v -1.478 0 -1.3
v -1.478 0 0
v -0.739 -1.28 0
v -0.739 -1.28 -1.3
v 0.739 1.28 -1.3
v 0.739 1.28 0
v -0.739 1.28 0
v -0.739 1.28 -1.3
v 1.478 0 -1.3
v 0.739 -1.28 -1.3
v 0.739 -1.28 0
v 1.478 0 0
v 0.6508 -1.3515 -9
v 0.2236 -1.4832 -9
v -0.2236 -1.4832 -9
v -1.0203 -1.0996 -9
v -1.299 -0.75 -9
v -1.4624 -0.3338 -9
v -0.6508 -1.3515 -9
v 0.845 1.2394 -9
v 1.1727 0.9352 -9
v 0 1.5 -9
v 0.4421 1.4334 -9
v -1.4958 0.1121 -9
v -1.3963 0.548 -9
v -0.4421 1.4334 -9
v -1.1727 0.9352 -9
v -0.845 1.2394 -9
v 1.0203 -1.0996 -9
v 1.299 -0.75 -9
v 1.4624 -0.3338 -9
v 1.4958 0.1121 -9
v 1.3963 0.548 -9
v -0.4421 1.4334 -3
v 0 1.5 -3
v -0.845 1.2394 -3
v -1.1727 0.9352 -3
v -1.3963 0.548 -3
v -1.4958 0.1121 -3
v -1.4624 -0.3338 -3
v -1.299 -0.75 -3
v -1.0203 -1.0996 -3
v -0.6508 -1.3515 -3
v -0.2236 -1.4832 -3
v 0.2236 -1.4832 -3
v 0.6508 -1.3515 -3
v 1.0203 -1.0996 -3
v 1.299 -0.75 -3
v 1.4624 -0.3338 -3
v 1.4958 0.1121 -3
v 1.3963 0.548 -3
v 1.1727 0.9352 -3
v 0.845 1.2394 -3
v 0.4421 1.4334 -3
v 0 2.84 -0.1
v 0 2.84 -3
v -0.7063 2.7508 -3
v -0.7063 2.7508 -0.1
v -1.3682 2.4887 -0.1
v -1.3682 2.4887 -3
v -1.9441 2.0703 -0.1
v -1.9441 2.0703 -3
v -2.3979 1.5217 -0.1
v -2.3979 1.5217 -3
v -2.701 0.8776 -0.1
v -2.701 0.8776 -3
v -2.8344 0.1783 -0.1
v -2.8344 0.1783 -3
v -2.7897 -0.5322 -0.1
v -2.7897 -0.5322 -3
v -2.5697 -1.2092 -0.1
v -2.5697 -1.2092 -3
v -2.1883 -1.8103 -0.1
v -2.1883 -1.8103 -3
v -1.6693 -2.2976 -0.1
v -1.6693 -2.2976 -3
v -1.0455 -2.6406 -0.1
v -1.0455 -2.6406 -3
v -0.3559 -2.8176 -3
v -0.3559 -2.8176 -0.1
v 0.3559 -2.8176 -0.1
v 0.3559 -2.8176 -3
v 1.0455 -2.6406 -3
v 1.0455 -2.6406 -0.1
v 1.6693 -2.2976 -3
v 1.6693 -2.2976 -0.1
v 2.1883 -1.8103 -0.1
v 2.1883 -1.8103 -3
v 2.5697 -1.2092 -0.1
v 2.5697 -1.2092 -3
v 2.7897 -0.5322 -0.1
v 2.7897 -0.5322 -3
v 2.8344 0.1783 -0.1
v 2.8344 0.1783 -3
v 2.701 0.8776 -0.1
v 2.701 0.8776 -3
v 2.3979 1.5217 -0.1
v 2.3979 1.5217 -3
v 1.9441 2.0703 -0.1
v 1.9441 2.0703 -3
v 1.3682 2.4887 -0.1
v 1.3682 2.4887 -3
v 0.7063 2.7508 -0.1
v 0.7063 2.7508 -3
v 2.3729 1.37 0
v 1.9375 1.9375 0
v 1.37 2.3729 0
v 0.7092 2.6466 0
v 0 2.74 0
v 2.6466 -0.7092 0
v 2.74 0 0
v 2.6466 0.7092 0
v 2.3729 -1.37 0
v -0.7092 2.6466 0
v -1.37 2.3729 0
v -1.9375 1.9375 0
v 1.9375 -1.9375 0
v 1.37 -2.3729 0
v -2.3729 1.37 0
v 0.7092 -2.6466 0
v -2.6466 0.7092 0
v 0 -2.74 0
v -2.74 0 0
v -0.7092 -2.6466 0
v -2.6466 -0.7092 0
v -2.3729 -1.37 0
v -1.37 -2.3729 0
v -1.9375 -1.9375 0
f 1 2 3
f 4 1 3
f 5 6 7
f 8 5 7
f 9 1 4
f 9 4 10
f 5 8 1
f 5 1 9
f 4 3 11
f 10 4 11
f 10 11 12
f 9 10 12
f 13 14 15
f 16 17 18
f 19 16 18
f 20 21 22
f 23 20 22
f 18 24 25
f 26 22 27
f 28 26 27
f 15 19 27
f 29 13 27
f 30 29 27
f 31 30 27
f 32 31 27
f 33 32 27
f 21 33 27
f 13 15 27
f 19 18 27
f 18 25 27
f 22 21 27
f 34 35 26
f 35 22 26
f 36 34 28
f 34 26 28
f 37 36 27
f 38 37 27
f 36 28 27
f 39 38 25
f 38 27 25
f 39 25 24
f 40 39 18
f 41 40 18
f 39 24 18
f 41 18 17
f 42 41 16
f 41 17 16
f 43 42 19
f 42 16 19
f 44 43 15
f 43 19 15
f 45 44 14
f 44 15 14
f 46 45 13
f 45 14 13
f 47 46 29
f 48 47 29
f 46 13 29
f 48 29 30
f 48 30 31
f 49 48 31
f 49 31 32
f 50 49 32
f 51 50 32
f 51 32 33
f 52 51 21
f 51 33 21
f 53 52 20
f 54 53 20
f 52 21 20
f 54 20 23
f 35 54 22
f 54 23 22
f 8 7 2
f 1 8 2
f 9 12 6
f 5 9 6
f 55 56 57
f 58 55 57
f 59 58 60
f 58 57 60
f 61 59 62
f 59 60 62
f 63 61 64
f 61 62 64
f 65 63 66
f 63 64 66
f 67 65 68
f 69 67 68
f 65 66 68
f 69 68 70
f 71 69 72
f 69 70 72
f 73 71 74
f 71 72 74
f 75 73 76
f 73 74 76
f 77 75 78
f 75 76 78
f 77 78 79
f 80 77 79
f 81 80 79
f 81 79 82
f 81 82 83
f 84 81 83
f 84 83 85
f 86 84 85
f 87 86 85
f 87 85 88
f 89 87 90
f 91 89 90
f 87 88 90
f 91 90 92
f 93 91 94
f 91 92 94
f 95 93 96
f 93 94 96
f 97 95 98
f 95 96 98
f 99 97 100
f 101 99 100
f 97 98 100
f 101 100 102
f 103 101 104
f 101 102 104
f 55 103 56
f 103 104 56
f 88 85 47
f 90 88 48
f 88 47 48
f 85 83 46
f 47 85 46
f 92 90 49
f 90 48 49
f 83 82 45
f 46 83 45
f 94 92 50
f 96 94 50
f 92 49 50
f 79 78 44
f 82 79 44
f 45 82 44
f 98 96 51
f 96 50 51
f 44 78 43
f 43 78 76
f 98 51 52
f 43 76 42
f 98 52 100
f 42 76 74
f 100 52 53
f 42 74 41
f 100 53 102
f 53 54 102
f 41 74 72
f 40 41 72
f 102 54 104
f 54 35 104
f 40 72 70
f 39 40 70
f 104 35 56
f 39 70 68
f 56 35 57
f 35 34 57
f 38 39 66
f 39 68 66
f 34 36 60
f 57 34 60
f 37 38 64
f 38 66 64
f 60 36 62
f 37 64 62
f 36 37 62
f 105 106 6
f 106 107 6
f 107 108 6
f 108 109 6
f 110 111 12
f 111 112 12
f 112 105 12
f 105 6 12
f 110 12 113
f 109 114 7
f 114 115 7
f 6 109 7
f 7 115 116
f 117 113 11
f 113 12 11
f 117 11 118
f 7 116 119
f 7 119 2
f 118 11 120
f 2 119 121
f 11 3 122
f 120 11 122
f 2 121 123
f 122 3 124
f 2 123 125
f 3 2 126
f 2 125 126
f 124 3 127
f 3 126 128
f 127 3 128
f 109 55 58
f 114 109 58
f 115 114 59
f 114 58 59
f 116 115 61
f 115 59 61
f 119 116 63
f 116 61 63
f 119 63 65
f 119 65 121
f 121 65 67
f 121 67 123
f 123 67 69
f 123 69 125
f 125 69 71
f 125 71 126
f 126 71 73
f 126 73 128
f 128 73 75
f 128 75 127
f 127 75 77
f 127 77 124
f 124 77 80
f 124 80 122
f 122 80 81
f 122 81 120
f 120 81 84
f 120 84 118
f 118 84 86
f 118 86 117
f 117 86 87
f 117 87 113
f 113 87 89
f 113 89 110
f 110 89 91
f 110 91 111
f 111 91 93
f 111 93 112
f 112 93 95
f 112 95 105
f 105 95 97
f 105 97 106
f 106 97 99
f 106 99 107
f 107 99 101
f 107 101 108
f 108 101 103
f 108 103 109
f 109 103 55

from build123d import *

# Parameters (mm, degrees)
CUT_EXTRUDE_1_DEPTH = 1.3
CHAMFER_628_SIZE    = 0.1


with BuildPart() as part:
    # 草图1 → 旋转1 (revolve)
    with BuildSketch(Plane(origin=(0, 0, 0), x_dir=(0, 0, -1), z_dir=(1, 0, 0))):
        Polygon((0, 0), (0, 2.84), (3, 2.84), (3, 1.5), (9, 1.5), (9, 0), align=None)
    revolve(axis=Axis((0, 0, -9), (0, 0, 1)))

    # 草图2 → 切除-拉伸1 (cut)
    with BuildSketch(Plane.XY):
        Polygon((0.739008345, 1.28), (-0.739008345, 1.28), (-1.478016689, 0), (-0.739008345, -1.28), (0.739008345, -1.28), (1.478016689, 0), align=None)
    extrude(amount=-CUT_EXTRUDE_1_DEPTH, mode=Mode.SUBTRACT)

    # Chamfer 628
    chamfer_628_edges = [part.edges().sort_by_distance(p)[0] for p in [
        (0, -2.84, 0),
    ]]
    chamfer(chamfer_628_edges, length=CHAMFER_628_SIZE)


solid = part.part
